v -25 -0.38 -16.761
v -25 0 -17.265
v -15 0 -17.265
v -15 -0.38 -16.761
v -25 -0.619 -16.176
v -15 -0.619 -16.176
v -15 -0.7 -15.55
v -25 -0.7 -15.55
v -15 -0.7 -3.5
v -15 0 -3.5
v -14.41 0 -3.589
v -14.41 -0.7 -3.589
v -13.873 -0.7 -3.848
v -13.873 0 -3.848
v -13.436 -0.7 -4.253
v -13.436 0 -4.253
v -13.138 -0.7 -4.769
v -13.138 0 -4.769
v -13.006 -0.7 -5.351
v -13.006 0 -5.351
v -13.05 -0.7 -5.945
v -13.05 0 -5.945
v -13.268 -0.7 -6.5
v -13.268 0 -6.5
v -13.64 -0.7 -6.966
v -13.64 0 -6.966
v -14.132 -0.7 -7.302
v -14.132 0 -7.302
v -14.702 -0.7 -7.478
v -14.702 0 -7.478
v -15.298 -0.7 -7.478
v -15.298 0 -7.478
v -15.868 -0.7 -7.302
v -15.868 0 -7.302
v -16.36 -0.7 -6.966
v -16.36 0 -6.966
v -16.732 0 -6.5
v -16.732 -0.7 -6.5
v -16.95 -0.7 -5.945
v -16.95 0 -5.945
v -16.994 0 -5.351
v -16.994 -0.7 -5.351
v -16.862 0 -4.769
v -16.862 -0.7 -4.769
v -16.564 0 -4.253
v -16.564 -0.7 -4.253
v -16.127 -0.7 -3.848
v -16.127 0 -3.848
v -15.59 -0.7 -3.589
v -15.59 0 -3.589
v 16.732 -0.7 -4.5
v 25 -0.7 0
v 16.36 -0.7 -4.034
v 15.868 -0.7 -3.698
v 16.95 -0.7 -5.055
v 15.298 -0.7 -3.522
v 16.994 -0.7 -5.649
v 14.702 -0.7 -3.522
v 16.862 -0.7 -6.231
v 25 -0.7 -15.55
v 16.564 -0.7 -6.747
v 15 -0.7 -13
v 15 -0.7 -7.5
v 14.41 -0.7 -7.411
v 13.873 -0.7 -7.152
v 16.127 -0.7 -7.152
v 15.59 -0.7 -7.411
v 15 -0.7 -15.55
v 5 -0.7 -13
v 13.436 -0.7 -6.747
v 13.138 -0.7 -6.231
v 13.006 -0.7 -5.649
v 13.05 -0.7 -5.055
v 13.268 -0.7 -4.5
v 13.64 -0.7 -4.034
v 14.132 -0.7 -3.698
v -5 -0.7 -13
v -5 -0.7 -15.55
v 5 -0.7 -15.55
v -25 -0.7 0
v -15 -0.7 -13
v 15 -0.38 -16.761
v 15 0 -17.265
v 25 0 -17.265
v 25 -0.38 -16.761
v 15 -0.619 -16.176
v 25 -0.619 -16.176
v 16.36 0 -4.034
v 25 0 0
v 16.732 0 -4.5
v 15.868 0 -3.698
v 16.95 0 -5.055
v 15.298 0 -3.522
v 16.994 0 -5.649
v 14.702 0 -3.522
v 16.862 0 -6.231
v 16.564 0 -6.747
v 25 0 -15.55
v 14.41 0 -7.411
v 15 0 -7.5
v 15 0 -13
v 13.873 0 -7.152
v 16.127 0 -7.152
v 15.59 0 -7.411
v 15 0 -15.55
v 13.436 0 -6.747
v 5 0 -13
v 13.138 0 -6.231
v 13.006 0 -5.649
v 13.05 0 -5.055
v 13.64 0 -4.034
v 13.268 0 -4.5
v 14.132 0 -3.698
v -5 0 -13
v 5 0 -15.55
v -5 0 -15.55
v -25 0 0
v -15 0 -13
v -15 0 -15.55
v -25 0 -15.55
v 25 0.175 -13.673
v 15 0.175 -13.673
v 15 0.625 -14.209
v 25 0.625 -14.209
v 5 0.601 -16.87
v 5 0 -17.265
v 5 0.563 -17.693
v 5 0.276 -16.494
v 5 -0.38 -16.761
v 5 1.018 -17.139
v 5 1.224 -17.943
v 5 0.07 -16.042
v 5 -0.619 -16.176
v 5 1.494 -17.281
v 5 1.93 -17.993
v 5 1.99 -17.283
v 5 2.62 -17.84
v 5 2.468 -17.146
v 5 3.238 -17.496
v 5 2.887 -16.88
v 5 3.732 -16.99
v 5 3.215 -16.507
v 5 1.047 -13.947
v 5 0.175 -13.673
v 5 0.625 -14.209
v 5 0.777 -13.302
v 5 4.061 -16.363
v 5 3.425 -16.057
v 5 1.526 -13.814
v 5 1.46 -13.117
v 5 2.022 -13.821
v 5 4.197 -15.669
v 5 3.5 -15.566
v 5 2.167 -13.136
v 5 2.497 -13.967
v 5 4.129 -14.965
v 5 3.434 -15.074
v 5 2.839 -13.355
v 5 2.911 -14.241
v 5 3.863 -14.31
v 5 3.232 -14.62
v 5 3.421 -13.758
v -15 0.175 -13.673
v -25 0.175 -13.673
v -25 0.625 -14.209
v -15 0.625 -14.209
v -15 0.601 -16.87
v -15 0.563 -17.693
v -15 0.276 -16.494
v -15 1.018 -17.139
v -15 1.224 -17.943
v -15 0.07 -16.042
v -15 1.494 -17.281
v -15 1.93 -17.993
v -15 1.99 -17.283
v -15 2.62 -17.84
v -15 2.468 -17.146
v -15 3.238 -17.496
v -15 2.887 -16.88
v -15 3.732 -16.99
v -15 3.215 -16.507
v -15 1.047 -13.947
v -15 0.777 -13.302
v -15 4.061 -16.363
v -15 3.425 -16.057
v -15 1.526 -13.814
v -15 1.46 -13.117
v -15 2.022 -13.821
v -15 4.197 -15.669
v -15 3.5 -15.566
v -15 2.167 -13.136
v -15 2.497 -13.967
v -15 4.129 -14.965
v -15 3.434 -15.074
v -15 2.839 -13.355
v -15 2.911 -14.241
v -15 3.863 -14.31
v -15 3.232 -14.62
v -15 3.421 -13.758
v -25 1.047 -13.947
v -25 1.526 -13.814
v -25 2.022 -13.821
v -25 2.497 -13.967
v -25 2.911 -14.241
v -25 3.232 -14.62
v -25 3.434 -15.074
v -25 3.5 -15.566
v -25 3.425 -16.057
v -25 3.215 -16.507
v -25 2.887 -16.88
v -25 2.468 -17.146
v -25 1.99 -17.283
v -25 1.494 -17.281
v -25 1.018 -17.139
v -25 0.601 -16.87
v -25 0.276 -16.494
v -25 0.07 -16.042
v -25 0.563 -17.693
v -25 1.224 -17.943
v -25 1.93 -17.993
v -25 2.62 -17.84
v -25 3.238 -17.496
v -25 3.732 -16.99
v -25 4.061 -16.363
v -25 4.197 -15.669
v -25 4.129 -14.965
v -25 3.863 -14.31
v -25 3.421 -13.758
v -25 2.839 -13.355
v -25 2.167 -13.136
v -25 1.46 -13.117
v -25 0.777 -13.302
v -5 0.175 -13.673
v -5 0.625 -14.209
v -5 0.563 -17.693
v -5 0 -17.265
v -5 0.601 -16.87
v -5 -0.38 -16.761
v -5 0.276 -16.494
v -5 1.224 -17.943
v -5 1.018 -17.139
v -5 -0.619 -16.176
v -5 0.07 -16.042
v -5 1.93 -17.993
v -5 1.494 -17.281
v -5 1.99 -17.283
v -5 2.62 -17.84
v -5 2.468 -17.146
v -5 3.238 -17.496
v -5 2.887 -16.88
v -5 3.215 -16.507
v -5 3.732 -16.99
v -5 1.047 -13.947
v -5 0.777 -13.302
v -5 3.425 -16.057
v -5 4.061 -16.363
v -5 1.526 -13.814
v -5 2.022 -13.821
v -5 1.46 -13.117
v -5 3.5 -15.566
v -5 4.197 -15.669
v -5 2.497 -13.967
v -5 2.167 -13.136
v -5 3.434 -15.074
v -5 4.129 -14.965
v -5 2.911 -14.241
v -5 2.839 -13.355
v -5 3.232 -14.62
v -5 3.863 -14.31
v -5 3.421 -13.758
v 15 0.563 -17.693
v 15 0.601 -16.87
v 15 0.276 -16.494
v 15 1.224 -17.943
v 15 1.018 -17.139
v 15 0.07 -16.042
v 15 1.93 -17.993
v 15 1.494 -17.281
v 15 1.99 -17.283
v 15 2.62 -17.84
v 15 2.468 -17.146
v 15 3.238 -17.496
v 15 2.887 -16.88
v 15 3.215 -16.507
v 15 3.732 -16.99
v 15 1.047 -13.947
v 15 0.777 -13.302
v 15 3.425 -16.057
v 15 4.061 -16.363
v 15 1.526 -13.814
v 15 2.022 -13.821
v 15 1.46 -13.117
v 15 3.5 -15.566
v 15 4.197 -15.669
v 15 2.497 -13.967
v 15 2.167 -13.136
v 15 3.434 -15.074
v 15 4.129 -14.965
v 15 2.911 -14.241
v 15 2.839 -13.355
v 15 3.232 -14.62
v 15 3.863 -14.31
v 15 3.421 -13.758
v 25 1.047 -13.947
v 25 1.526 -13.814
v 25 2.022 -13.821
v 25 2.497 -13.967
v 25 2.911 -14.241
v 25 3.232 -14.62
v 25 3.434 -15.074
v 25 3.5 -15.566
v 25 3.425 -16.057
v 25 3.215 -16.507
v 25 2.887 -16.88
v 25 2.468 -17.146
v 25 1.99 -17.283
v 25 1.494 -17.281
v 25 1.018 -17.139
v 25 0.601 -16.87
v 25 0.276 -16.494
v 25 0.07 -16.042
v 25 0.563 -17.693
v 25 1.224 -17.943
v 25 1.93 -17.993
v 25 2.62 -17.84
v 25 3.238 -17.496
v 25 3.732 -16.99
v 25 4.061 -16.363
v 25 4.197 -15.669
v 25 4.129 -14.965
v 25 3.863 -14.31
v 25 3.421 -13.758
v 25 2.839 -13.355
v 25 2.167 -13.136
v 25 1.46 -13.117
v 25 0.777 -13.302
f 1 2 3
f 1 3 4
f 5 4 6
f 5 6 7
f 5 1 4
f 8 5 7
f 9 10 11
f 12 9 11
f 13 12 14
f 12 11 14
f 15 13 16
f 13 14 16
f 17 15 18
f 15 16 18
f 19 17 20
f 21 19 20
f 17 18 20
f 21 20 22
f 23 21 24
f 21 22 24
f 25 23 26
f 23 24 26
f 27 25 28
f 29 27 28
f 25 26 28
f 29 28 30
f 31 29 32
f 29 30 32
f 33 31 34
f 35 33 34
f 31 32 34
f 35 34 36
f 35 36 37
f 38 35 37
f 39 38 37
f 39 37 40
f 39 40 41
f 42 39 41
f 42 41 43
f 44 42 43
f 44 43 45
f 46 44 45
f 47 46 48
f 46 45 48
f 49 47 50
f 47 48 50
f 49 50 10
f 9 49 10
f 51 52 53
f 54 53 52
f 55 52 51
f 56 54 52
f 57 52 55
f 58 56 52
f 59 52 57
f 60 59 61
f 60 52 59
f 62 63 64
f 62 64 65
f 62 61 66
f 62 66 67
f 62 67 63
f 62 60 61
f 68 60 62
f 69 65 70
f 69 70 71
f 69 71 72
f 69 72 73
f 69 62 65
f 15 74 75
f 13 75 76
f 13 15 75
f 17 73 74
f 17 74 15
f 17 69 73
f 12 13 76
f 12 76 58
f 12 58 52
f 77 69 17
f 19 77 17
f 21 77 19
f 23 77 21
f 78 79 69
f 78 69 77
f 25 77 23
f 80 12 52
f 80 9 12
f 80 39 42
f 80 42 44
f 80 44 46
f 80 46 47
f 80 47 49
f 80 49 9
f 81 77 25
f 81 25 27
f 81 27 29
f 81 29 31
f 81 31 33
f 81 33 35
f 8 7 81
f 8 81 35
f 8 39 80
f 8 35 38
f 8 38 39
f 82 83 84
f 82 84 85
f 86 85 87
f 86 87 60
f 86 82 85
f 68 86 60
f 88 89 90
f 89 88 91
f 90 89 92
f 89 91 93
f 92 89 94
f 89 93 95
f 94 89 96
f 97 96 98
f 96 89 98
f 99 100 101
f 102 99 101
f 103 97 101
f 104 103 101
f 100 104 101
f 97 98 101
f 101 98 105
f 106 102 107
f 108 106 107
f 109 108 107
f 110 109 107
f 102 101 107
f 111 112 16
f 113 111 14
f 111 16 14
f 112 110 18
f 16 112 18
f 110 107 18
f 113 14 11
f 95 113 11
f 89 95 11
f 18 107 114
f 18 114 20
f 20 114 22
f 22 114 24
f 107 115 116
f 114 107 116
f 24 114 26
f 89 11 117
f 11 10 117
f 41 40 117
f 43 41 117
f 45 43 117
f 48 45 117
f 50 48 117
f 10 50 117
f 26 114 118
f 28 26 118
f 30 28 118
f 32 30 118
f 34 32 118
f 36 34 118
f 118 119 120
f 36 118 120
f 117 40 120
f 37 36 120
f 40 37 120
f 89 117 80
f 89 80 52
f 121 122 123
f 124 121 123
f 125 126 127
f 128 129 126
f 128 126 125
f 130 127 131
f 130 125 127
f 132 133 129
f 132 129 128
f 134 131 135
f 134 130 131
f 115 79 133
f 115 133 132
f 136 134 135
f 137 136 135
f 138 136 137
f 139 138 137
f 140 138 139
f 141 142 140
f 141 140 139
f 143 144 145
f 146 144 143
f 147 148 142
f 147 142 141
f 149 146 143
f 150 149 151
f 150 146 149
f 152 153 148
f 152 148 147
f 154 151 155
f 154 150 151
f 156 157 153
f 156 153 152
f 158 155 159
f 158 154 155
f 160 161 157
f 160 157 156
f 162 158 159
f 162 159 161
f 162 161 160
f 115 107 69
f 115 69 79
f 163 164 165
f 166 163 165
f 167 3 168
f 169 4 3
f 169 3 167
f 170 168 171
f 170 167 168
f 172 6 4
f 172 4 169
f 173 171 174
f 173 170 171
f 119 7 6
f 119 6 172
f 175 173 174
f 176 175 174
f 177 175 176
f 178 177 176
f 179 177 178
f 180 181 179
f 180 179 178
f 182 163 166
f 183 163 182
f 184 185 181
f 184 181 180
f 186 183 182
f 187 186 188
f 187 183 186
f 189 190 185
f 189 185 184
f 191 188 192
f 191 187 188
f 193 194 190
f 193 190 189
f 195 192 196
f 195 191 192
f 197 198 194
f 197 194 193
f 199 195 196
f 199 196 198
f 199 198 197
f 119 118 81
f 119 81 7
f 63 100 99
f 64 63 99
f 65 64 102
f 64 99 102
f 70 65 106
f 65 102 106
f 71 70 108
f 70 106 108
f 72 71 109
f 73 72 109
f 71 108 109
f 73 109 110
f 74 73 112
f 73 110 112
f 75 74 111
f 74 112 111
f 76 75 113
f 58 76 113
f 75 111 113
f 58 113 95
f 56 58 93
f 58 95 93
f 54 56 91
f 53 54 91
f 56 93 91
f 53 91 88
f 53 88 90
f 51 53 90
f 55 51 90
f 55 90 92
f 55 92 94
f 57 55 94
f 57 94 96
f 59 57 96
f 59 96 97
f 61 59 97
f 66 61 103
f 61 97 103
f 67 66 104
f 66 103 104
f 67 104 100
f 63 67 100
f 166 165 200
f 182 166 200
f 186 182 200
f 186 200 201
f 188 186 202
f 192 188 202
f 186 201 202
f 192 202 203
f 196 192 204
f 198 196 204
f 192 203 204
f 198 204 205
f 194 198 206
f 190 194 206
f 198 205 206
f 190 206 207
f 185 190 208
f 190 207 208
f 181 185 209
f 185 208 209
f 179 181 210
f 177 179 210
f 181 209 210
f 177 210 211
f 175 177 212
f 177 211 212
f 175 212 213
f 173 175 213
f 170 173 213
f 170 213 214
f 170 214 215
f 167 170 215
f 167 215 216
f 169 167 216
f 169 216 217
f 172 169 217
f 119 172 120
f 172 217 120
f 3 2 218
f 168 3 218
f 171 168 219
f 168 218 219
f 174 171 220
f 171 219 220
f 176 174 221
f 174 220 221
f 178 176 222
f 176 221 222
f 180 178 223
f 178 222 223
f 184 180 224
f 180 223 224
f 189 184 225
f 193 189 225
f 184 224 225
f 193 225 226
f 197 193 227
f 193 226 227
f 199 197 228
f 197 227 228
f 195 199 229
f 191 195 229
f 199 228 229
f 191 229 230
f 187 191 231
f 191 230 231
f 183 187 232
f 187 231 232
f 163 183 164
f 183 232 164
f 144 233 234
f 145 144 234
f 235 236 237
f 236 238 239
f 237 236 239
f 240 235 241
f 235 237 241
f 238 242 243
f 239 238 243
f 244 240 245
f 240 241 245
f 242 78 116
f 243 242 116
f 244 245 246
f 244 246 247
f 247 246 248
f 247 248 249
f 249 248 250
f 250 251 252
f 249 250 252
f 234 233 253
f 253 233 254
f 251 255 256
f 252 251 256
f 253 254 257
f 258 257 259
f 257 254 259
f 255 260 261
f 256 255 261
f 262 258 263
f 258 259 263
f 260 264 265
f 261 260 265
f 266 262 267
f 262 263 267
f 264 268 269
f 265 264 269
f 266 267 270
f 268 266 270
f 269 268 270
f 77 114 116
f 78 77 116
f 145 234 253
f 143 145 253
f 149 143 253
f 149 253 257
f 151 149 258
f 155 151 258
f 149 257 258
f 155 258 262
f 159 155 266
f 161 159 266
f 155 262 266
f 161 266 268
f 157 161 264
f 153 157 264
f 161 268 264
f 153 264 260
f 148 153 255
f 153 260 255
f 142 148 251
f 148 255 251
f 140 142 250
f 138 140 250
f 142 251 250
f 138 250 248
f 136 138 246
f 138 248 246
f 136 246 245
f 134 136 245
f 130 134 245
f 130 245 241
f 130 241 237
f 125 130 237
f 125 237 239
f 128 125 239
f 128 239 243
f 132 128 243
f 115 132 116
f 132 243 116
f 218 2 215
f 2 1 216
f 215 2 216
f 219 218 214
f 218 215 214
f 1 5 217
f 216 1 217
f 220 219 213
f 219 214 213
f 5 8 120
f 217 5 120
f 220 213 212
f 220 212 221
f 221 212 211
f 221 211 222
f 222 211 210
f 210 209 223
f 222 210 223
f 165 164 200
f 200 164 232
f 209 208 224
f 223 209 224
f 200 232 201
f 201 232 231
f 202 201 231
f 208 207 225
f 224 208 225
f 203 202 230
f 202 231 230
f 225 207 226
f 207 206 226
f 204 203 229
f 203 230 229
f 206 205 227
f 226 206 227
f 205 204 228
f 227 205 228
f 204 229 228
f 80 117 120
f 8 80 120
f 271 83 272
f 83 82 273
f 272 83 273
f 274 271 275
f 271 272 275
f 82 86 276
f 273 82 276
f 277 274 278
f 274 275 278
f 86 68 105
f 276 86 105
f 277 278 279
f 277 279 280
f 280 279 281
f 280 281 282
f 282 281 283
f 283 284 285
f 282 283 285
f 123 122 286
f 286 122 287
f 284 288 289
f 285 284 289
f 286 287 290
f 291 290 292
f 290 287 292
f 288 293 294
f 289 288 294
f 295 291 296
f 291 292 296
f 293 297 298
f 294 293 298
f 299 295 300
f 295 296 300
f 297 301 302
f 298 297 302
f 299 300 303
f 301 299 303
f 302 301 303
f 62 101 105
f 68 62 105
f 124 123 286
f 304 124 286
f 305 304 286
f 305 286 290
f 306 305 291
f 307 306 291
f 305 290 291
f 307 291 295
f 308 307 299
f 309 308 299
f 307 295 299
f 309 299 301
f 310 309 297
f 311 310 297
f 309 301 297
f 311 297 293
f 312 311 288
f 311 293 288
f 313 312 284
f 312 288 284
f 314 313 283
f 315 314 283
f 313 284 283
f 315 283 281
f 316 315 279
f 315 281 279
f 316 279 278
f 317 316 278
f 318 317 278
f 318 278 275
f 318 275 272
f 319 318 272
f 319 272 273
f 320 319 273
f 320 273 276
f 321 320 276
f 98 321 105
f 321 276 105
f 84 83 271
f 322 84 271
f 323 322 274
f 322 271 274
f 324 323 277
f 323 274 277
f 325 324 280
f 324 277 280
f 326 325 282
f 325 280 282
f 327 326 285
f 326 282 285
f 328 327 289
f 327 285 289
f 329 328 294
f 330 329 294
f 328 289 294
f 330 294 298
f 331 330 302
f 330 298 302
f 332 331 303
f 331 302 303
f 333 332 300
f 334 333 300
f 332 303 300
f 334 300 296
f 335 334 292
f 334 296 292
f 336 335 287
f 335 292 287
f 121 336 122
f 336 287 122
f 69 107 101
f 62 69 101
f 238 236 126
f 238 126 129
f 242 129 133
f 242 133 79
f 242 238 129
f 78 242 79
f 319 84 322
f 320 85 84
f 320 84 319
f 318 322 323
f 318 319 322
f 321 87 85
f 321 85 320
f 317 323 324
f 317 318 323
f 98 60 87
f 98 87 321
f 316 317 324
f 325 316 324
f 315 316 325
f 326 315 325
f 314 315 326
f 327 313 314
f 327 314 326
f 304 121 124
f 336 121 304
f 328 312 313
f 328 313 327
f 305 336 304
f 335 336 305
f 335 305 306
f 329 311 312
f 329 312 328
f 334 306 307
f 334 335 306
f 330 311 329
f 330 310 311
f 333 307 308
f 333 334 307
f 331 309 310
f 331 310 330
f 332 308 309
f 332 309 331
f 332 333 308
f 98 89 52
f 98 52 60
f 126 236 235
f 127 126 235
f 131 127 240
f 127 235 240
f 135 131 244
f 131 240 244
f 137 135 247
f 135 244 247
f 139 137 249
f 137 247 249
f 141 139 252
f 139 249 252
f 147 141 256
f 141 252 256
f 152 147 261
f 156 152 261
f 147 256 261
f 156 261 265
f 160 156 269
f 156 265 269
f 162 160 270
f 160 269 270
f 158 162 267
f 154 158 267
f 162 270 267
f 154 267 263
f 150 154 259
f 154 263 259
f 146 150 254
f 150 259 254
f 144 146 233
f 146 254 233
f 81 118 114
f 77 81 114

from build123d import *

# Parameters (mm, degrees)
SKETCH_1_R             = 2
SM_BASE_FLANGE_1_DEPTH = 0.7
OTHER_START            = -25
OTHER_1_DEPTH          = 50
OTHER_1_2_DEPTH        = 10
OTHER_START_2          = -5
OTHER_1_3_DEPTH        = 10
OTHER_START_3          = 15
OTHER_1_4_DEPTH        = 10


# Read off the part's stored shape, not the designer's step: 褶边1
# Sheet-metal steps are written as plain solids
with BuildPart() as part:
    # Sketch 1 → 基体-法兰1 (new body)
    with BuildSketch(Plane(origin=(0, 0, 0), x_dir=(1, 0, 0), z_dir=(0, 1, 0))):
        Polygon((0, 0), (-25, 0), (-25, 18), (-15, 18), (-15, 13), (-5, 13), (-5, 18), (5, 18), (5, 13), (15, 13), (15, 18), (25, 18), (25, 0), align=None)
        with Locations(Location((-15, 5.5, 0), (0, 0, 270))):
            Circle(SKETCH_1_R, mode=Mode.SUBTRACT)
        with Locations(Location((15, 5.5, 0), (0, 0, 90))):
            Circle(SKETCH_1_R, mode=Mode.SUBTRACT)
    extrude(amount=-SM_BASE_FLANGE_1_DEPTH)

    # Other 1 outline → Other 1 (cut)
    with BuildSketch(Plane.YZ.offset(OTHER_START)):
        with BuildLine():
            Line((0, -18), (0, -17.264642819))
            ThreePointArc((0, -17.264642819), (-0.518259244, -16.476012959), (-0.7, -15.55))
            Line((-0.7, -15.55), (-0.7, -18))
            Line((-0.7, -18), (0, -18))
        make_face()
    extrude(amount=OTHER_1_DEPTH, mode=Mode.SUBTRACT)

    # Other 1 2 outline → Other 1 2 (add)
    with BuildSketch(Plane.YZ.offset(OTHER_START)):
        with BuildLine():
            Line((0.175170356, -13.673191114), (0.625121683, -14.209422225))
            ThreePointArc((0.625121683, -14.209422225), (3.336038627, -16.289581958), (0, -15.55))
            Line((0, -15.55), (0, -17.264642819))
            ThreePointArc((0, -17.264642819), (4.197091003, -15.669355023), (0.175170356, -13.673191114))
        make_face()
    extrude(amount=OTHER_1_2_DEPTH)

    # Other 1 3 outline → Other 1 3 (add)
    with BuildSketch(Plane.YZ.offset(OTHER_START_2)):
        with BuildLine():
            Line((0.175170356, -13.673191114), (0.625121683, -14.209422225))
            ThreePointArc((0.625121683, -14.209422225), (3.336038627, -16.289581958), (0, -15.55))
            Line((0, -15.55), (0, -17.264642819))
            ThreePointArc((0, -17.264642819), (4.197091003, -15.669355023), (0.175170356, -13.673191114))
        make_face()
    extrude(amount=OTHER_1_3_DEPTH)

    # Other 1 4 outline → Other 1 4 (add)
    with BuildSketch(Plane.YZ.offset(OTHER_START_3)):
        with BuildLine():
            Line((0.175170356, -13.673191114), (0.625121683, -14.209422225))
            ThreePointArc((0.625121683, -14.209422225), (3.336038627, -16.289581958), (0, -15.55))
            Line((0, -15.55), (0, -17.264642819))
            ThreePointArc((0, -17.264642819), (4.197091003, -15.669355023), (0.175170356, -13.673191114))
        make_face()
    extrude(amount=OTHER_1_4_DEPTH)


solid = part.part
